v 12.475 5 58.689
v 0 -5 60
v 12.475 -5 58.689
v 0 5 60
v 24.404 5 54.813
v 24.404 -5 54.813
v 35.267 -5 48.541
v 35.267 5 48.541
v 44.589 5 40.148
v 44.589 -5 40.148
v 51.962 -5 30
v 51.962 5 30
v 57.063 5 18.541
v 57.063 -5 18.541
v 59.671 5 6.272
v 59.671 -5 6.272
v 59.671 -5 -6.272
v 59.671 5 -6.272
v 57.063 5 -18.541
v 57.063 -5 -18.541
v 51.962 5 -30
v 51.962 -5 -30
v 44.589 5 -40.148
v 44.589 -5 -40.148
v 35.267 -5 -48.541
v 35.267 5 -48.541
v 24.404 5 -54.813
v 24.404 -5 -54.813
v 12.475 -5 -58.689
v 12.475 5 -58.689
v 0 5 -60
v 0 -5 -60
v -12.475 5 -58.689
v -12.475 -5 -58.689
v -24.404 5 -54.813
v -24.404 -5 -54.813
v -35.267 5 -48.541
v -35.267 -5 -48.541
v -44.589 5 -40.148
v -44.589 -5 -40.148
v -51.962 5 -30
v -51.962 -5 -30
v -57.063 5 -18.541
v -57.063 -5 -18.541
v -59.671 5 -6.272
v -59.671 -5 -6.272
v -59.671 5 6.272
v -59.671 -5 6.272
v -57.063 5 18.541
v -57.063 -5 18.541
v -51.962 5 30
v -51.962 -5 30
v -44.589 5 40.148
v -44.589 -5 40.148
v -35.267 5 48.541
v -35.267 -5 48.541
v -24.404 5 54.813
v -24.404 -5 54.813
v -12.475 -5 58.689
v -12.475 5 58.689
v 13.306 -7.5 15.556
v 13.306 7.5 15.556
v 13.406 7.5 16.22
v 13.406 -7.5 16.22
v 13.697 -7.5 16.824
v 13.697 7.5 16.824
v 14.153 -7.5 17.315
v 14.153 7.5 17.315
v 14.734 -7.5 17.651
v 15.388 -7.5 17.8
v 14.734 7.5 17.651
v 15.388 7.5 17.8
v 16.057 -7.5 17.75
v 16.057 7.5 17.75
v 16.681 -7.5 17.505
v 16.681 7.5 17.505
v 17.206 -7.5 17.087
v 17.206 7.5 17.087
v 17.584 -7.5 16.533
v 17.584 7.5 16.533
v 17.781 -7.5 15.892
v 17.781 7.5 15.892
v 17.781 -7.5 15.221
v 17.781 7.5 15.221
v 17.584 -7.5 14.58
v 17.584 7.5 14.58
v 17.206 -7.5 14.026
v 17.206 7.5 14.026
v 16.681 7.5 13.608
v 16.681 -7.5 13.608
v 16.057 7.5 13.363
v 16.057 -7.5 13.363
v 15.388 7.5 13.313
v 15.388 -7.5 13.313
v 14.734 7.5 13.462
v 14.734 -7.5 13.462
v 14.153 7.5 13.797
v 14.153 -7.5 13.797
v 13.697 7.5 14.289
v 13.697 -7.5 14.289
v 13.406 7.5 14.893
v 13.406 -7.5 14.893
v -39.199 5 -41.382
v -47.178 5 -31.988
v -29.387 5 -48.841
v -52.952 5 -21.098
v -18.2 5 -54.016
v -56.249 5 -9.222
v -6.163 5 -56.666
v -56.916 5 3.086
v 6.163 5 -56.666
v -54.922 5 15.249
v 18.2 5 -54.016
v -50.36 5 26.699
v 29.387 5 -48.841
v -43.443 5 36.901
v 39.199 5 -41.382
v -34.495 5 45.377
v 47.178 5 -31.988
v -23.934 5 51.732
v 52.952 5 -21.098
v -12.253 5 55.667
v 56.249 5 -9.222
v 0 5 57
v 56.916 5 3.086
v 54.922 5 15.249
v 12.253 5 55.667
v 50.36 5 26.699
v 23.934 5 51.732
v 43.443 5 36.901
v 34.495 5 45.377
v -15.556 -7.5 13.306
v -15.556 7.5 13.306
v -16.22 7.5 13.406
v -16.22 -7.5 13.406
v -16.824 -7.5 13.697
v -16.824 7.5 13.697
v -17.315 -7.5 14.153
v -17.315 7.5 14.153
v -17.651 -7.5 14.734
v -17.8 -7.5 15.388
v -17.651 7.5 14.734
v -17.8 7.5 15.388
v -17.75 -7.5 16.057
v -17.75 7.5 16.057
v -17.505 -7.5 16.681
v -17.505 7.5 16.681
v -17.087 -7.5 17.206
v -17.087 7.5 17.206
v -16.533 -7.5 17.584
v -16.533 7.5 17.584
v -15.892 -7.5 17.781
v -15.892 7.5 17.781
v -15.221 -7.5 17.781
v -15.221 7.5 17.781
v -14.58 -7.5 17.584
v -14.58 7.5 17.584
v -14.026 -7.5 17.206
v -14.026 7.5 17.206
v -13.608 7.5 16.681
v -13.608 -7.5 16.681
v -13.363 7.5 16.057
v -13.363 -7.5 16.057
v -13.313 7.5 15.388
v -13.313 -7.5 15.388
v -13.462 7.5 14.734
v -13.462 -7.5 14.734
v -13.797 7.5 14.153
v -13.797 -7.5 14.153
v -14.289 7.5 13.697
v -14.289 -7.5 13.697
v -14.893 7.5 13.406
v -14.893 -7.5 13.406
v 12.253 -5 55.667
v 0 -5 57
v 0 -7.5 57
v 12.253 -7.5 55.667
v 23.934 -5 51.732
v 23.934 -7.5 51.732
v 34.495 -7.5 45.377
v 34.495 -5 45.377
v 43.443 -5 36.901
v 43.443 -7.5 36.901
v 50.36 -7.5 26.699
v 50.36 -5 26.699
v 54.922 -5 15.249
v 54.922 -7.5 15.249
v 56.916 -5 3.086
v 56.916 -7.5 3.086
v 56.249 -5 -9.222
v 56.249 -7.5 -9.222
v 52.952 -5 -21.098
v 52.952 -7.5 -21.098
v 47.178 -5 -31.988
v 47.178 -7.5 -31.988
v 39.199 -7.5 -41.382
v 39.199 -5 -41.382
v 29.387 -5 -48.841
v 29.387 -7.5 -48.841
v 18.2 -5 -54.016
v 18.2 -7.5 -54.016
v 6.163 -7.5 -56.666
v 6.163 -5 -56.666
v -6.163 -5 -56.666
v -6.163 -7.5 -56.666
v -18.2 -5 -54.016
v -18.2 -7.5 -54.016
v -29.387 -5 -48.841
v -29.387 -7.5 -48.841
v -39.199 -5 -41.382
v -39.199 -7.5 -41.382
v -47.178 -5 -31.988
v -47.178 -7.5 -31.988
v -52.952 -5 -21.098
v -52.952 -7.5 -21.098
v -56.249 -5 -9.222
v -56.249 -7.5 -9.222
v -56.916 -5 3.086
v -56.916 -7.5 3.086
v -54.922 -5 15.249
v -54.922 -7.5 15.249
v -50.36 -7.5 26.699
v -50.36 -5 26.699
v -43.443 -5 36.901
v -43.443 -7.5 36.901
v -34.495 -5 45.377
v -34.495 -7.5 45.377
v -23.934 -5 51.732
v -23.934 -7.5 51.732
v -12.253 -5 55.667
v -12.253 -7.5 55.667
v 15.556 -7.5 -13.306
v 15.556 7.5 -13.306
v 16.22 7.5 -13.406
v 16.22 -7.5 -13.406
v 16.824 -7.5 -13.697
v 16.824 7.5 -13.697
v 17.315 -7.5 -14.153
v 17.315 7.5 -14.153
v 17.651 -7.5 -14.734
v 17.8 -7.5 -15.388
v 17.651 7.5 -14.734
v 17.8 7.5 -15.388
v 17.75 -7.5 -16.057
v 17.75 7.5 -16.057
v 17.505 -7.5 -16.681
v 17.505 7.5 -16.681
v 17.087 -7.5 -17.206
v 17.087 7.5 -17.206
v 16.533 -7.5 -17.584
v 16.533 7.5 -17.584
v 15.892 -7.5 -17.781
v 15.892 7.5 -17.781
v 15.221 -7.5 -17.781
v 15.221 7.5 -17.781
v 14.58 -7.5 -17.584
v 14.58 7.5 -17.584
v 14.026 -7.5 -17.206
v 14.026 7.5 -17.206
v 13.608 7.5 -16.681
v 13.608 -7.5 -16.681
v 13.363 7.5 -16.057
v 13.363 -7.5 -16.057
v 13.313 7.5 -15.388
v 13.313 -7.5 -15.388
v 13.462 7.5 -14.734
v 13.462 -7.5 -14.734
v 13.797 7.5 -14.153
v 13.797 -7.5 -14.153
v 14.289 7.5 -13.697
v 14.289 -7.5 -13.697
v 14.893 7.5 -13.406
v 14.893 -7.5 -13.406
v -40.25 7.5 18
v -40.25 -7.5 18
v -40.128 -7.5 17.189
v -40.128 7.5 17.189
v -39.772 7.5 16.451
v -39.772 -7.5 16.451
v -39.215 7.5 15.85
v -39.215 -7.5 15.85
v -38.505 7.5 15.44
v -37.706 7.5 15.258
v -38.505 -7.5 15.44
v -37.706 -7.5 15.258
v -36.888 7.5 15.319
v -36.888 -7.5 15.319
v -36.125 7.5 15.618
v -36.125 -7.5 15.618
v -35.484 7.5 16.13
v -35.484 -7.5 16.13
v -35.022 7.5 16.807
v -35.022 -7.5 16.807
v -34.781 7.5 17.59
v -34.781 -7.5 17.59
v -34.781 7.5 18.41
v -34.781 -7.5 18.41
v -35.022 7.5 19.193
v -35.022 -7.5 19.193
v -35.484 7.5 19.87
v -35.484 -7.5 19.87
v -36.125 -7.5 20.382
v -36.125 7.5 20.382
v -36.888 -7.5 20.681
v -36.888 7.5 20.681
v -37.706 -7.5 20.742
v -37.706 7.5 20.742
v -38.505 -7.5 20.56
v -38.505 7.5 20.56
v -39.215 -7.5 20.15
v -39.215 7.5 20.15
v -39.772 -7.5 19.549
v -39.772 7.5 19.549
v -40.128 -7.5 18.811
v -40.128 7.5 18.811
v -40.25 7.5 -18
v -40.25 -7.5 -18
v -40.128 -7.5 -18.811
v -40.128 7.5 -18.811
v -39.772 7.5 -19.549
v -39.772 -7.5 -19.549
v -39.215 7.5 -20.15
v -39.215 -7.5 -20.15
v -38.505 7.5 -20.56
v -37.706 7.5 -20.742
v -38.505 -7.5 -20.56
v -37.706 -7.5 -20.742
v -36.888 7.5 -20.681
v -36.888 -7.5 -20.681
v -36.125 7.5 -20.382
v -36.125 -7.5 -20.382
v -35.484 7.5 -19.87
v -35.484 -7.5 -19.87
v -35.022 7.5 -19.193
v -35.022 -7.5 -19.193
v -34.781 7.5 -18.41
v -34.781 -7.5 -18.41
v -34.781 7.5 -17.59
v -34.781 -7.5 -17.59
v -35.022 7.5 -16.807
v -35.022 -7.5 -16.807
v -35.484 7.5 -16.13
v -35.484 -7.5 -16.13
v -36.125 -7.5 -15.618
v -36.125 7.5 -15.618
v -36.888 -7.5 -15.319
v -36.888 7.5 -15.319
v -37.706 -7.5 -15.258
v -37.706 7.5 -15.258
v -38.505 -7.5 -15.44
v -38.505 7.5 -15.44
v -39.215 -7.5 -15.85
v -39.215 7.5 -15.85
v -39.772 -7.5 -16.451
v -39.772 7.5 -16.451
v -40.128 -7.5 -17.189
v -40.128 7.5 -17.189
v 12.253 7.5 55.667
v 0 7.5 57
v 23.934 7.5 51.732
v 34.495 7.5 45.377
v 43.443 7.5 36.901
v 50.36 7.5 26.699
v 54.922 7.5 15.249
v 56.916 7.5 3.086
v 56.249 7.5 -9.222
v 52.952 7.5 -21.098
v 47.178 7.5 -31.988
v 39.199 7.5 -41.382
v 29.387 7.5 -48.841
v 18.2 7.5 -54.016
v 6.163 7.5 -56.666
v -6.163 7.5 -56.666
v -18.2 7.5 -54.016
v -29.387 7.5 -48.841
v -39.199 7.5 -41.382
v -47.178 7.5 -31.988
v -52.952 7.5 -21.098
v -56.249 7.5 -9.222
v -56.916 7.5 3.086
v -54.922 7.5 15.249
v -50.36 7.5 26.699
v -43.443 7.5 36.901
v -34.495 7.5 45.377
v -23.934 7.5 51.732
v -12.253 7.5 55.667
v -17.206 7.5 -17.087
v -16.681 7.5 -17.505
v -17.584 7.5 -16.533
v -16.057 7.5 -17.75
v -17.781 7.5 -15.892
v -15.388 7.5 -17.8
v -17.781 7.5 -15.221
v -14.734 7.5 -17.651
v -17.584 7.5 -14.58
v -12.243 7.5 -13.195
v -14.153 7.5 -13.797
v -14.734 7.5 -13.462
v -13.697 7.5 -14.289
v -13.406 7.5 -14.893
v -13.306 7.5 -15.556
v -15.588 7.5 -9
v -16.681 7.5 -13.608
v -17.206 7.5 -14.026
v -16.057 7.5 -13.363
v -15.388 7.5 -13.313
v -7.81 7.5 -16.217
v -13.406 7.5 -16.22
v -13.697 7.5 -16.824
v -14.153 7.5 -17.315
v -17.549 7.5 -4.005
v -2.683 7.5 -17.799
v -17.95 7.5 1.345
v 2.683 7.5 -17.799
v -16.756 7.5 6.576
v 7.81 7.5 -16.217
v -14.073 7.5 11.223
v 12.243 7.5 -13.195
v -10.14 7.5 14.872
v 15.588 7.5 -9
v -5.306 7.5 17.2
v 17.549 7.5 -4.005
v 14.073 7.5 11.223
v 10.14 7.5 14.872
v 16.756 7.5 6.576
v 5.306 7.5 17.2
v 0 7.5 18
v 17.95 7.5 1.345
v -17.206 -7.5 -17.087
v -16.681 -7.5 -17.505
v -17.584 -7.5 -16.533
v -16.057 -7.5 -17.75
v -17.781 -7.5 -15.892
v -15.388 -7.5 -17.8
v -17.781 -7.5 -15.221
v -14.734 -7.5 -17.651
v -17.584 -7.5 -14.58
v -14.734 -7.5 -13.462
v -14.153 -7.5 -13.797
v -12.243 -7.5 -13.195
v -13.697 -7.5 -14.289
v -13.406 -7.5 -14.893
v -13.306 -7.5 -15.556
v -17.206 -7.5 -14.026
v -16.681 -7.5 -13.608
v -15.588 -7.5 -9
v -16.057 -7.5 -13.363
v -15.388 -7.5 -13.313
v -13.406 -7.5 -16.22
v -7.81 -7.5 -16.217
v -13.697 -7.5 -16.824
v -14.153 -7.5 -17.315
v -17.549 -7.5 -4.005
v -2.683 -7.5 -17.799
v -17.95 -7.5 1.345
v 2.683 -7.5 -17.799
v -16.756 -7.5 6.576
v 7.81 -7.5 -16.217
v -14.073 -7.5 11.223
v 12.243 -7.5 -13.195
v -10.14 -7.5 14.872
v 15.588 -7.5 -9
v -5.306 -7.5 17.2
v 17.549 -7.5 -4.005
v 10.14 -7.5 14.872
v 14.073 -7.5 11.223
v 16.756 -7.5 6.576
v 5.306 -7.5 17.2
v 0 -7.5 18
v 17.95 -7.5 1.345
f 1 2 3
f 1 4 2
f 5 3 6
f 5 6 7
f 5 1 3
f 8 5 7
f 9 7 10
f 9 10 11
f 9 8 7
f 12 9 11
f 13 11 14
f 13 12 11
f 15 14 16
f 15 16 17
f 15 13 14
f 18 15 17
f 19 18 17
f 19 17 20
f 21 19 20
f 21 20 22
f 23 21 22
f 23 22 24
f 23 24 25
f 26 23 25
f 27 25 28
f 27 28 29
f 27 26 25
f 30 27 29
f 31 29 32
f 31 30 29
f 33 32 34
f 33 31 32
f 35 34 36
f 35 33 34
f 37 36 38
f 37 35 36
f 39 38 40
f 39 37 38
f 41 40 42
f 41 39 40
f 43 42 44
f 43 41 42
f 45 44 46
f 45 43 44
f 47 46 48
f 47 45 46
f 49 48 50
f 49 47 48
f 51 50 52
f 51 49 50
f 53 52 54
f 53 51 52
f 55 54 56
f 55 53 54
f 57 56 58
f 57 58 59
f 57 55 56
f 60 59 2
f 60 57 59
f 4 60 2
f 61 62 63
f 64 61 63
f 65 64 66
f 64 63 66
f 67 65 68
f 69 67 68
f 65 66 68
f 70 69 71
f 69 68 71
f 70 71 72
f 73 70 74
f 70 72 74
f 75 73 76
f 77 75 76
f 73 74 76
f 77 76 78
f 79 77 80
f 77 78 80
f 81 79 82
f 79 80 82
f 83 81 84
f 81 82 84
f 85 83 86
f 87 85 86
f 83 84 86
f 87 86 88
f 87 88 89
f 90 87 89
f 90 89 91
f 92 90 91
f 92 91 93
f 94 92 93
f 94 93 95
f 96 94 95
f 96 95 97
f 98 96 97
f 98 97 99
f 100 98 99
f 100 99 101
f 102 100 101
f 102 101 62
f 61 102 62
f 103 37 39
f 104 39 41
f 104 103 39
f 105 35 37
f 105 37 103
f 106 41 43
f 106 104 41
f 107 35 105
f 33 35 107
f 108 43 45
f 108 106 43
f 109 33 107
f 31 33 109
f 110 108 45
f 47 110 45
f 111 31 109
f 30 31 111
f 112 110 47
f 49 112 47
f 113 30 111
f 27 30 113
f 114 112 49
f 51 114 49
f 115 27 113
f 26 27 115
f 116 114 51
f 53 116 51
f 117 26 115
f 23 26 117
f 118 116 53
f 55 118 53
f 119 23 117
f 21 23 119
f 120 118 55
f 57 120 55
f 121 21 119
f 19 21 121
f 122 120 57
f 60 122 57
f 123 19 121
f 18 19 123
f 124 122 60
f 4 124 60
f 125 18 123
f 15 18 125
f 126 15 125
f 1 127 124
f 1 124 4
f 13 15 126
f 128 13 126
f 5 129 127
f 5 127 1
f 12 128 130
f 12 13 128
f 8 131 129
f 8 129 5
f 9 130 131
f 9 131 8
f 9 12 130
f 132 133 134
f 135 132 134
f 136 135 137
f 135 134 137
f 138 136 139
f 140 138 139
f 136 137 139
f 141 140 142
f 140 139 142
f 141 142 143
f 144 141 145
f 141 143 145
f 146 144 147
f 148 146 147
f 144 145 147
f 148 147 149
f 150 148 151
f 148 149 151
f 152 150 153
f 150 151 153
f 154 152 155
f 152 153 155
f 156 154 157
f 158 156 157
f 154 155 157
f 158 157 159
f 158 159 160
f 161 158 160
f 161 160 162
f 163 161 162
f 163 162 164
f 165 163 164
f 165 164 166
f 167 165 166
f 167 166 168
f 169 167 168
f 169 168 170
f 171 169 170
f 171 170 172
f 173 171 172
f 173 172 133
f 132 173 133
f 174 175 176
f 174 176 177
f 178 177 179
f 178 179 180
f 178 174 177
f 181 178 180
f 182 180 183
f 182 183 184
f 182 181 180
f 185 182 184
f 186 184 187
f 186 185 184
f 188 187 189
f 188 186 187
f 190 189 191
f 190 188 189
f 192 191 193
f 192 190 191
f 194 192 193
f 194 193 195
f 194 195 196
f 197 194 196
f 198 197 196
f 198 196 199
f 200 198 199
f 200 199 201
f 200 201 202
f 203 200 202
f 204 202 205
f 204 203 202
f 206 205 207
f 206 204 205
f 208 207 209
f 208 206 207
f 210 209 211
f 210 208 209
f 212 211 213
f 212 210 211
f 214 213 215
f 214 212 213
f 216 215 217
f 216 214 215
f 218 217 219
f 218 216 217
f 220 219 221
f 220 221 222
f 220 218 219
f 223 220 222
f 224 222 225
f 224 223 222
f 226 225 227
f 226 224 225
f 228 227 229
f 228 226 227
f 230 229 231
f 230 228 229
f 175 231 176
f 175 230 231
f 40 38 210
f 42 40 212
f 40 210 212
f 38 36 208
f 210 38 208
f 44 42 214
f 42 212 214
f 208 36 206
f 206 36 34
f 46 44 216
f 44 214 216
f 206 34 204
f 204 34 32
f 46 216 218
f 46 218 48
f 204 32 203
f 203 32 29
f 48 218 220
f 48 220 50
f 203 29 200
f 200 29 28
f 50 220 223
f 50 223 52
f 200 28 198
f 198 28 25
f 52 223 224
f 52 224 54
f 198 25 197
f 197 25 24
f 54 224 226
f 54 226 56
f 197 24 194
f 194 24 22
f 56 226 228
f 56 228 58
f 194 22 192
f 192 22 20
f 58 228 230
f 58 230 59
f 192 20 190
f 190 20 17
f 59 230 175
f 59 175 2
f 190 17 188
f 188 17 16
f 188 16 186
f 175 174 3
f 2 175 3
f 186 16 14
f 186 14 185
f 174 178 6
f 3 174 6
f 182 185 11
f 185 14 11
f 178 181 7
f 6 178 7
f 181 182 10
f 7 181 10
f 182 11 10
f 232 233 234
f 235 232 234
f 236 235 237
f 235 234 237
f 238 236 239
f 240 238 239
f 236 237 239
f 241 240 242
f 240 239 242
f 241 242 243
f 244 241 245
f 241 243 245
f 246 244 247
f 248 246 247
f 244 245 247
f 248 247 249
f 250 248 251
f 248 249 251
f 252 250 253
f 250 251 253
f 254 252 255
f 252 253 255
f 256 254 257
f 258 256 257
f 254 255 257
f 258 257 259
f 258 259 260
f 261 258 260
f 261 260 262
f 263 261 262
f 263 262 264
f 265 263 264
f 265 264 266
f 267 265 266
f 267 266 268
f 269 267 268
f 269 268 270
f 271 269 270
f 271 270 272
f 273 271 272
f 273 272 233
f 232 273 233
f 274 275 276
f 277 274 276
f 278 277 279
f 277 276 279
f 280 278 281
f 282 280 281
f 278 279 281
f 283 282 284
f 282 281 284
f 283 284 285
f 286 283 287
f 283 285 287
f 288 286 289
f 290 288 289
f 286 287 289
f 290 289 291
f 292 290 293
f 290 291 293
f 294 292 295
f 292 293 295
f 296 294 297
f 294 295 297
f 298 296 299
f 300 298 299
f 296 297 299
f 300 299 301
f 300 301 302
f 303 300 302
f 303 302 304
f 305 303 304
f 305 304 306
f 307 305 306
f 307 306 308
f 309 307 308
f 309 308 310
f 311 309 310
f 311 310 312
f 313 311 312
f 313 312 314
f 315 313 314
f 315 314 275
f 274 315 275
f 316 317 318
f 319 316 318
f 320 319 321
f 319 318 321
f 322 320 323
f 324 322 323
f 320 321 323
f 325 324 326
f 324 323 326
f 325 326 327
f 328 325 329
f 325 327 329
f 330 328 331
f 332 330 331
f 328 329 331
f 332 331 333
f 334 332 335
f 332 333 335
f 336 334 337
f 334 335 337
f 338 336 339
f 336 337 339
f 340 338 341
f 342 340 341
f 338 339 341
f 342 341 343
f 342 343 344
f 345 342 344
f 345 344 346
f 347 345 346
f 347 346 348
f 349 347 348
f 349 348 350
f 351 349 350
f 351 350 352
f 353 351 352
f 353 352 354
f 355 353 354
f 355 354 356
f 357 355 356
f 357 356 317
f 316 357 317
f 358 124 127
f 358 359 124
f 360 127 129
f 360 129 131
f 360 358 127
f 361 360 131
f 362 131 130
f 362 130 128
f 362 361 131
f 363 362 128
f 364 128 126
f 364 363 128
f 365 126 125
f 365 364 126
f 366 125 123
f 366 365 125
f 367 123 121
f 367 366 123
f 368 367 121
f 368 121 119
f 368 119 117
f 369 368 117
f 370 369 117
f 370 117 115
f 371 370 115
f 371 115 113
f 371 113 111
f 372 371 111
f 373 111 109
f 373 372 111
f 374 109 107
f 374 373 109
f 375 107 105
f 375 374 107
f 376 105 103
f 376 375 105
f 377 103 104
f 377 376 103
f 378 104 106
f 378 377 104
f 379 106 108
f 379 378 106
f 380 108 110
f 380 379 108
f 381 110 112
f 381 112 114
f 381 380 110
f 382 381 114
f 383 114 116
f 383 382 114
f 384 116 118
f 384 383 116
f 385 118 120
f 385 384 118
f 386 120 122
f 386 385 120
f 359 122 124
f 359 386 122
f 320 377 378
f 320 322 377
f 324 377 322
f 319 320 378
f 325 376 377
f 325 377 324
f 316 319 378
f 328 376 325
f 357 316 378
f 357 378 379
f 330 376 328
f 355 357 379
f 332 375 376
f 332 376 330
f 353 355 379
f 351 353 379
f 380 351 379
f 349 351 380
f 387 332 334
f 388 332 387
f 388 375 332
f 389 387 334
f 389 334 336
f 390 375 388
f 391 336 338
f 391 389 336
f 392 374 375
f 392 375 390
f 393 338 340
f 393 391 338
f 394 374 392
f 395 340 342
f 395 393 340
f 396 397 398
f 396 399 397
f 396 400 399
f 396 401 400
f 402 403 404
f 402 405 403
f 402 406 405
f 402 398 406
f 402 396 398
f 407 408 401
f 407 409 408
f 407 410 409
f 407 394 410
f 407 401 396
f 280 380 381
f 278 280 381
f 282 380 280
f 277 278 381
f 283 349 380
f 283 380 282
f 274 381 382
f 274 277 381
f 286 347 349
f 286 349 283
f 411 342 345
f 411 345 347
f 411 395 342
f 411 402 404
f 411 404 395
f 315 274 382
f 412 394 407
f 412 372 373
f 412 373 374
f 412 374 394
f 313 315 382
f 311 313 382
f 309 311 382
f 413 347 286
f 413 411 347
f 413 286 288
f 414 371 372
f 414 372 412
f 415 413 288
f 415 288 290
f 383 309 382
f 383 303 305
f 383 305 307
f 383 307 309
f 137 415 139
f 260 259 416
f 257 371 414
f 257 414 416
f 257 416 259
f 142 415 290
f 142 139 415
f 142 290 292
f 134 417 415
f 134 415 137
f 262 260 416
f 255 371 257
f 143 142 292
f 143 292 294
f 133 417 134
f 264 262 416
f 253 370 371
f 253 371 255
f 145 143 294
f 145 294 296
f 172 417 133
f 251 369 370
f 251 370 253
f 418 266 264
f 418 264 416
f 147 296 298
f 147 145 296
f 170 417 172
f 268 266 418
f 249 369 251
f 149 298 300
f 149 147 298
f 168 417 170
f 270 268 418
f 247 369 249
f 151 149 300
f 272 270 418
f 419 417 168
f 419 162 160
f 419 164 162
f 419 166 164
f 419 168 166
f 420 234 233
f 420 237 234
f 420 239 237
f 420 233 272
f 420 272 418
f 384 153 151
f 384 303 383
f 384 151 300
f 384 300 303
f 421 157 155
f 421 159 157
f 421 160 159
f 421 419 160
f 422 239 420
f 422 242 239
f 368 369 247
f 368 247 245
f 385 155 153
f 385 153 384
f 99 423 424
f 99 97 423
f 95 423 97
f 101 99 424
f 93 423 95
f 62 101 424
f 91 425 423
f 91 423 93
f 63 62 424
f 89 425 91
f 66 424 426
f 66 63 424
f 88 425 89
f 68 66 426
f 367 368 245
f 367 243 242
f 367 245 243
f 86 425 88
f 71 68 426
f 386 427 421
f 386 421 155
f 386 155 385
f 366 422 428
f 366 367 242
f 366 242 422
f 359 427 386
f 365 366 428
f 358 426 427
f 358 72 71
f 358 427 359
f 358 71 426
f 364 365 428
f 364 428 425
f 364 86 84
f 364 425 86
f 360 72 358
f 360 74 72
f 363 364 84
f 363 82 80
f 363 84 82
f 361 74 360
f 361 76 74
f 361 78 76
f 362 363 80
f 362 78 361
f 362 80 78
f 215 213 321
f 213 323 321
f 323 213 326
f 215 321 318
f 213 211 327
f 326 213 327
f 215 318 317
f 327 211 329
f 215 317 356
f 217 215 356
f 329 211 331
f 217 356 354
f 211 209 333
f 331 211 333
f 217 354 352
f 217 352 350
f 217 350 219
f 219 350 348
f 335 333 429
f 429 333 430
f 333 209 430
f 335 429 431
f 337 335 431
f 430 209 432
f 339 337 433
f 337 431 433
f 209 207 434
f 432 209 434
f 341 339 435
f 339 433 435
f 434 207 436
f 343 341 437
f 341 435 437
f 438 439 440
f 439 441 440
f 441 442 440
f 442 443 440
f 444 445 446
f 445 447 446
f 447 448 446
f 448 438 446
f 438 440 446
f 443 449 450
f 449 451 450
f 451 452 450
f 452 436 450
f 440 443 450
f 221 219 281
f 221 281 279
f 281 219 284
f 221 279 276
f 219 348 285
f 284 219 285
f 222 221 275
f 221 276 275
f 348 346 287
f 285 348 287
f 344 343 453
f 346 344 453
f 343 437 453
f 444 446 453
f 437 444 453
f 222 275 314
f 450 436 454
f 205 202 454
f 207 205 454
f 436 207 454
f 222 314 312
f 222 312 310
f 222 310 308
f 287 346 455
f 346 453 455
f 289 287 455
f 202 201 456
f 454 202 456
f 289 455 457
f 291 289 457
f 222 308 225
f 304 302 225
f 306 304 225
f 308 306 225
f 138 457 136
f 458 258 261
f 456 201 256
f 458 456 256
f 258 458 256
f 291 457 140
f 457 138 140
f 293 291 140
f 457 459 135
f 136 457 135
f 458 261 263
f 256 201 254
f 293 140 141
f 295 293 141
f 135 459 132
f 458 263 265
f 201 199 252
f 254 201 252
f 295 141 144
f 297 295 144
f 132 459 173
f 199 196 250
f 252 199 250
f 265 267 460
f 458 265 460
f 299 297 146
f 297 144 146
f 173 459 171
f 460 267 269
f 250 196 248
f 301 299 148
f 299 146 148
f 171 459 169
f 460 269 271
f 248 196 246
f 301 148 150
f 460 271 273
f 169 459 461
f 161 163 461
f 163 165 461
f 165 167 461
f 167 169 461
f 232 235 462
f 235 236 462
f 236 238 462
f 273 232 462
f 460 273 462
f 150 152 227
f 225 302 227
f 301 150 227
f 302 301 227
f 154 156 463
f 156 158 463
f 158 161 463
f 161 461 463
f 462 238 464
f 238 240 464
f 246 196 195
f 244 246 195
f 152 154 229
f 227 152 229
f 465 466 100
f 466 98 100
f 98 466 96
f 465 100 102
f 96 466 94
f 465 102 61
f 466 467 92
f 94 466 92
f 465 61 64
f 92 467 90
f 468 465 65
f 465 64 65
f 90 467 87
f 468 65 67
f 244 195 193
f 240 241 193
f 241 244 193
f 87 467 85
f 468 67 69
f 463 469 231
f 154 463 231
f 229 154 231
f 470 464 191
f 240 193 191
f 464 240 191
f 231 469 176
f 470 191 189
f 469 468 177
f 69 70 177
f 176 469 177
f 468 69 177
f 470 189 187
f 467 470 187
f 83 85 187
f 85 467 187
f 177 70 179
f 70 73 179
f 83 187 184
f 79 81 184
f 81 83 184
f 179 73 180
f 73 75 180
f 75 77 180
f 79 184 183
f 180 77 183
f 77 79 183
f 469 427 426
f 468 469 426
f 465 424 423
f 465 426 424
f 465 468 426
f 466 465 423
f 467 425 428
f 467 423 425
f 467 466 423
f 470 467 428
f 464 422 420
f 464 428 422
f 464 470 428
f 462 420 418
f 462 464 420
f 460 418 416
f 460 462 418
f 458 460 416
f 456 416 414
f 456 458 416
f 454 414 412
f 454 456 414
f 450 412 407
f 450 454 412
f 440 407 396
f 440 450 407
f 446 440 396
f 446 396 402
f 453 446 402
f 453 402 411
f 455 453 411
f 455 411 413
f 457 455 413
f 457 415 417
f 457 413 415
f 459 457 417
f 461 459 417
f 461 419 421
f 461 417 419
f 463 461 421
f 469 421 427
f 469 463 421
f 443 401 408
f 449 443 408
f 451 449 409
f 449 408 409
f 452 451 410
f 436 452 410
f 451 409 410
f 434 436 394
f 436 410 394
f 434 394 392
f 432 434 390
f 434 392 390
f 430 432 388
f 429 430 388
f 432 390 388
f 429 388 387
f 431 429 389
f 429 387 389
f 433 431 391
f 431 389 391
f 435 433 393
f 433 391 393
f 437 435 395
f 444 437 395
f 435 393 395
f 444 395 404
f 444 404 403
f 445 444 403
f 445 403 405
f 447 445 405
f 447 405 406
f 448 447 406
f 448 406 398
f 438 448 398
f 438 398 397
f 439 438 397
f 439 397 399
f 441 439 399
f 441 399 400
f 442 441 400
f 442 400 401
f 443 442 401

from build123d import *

# Parameters (mm, degrees)
SKETCH1_R                  = 57
EXTRUDE4_DEPTH             = 7.5
SKETCH_R                   = 60
SKETCH_R_2                 = 57
EXTRUDE5_DEPTH             = 5
EXTRUDE6_DEPTH             = 86.183625187
EXTRUDE6_DEPTH_BACK        = 86.183625187
SKETCH5_R                  = 18
F_4_5_4_5_DIAMETER_HOLE1_D = 4.5
CIRPATTERN1_COUNT          = 4
M5_CLEARANCE_HOLE1_D       = 5.5


with BuildPart() as part:
    # Sketch1 → Extrude4 (new, symmetric)
    with BuildSketch(Plane(origin=(0, 0, 0), x_dir=(1, 0, 0), z_dir=(0, 1, 0))):
        Circle(SKETCH1_R)
    extrude(amount=EXTRUDE4_DEPTH, both=True)

    # Sketch → Extrude5 (add, symmetric)
    with BuildSketch(Plane(origin=(0, 0, 0), x_dir=(1, 0, 0), z_dir=(0, 1, 0))):
        Circle(SKETCH_R)
        Circle(SKETCH_R_2, mode=Mode.SUBTRACT)
    extrude(amount=EXTRUDE5_DEPTH, both=True)

    # Sketch5 → Extrude6 (cut, two sides: drawn at the far end of the back side and taken through both)
    with BuildSketch(Plane(origin=(0, 0, 0), x_dir=(1, 0, 0), z_dir=(0, 1, 0)).offset(-EXTRUDE6_DEPTH_BACK)):
        Circle(SKETCH5_R)
    extrude(amount=EXTRUDE6_DEPTH + EXTRUDE6_DEPTH_BACK, mode=Mode.SUBTRACT)

    # Ø4.5 (4.5) Diameter Hole1 (through all)
    with Locations(Plane(origin=(0, -7.5, 0), x_dir=(-1, 0, 0), z_dir=(0, -1, 0))):
        with Locations((15.556349186, 15.556349186)):
            f_4_5_4_5_diameter_hole1 = Hole(F_4_5_4_5_DIAMETER_HOLE1_D / 2)

    # CirPattern1: Ø4.5 (4.5) Diameter Hole1 ×4 about axis
    cirpattern1_axis = Axis((0, -8.25, 0), (0, 1, 0))
    for i in range(1, CIRPATTERN1_COUNT):
        add(f_4_5_4_5_diameter_hole1.rotate(cirpattern1_axis, i * 360 / CIRPATTERN1_COUNT), mode=Mode.SUBTRACT)

    # M5 Clearance Hole1 (through all)
    with Locations(Plane(origin=(0, 7.5, 0), x_dir=(1, 0, 0), z_dir=(0, 1, 0))):
        with Locations((-37.5, 18), (-37.5, -18)):
            Hole(M5_CLEARANCE_HOLE1_D / 2)


solid = part.part
